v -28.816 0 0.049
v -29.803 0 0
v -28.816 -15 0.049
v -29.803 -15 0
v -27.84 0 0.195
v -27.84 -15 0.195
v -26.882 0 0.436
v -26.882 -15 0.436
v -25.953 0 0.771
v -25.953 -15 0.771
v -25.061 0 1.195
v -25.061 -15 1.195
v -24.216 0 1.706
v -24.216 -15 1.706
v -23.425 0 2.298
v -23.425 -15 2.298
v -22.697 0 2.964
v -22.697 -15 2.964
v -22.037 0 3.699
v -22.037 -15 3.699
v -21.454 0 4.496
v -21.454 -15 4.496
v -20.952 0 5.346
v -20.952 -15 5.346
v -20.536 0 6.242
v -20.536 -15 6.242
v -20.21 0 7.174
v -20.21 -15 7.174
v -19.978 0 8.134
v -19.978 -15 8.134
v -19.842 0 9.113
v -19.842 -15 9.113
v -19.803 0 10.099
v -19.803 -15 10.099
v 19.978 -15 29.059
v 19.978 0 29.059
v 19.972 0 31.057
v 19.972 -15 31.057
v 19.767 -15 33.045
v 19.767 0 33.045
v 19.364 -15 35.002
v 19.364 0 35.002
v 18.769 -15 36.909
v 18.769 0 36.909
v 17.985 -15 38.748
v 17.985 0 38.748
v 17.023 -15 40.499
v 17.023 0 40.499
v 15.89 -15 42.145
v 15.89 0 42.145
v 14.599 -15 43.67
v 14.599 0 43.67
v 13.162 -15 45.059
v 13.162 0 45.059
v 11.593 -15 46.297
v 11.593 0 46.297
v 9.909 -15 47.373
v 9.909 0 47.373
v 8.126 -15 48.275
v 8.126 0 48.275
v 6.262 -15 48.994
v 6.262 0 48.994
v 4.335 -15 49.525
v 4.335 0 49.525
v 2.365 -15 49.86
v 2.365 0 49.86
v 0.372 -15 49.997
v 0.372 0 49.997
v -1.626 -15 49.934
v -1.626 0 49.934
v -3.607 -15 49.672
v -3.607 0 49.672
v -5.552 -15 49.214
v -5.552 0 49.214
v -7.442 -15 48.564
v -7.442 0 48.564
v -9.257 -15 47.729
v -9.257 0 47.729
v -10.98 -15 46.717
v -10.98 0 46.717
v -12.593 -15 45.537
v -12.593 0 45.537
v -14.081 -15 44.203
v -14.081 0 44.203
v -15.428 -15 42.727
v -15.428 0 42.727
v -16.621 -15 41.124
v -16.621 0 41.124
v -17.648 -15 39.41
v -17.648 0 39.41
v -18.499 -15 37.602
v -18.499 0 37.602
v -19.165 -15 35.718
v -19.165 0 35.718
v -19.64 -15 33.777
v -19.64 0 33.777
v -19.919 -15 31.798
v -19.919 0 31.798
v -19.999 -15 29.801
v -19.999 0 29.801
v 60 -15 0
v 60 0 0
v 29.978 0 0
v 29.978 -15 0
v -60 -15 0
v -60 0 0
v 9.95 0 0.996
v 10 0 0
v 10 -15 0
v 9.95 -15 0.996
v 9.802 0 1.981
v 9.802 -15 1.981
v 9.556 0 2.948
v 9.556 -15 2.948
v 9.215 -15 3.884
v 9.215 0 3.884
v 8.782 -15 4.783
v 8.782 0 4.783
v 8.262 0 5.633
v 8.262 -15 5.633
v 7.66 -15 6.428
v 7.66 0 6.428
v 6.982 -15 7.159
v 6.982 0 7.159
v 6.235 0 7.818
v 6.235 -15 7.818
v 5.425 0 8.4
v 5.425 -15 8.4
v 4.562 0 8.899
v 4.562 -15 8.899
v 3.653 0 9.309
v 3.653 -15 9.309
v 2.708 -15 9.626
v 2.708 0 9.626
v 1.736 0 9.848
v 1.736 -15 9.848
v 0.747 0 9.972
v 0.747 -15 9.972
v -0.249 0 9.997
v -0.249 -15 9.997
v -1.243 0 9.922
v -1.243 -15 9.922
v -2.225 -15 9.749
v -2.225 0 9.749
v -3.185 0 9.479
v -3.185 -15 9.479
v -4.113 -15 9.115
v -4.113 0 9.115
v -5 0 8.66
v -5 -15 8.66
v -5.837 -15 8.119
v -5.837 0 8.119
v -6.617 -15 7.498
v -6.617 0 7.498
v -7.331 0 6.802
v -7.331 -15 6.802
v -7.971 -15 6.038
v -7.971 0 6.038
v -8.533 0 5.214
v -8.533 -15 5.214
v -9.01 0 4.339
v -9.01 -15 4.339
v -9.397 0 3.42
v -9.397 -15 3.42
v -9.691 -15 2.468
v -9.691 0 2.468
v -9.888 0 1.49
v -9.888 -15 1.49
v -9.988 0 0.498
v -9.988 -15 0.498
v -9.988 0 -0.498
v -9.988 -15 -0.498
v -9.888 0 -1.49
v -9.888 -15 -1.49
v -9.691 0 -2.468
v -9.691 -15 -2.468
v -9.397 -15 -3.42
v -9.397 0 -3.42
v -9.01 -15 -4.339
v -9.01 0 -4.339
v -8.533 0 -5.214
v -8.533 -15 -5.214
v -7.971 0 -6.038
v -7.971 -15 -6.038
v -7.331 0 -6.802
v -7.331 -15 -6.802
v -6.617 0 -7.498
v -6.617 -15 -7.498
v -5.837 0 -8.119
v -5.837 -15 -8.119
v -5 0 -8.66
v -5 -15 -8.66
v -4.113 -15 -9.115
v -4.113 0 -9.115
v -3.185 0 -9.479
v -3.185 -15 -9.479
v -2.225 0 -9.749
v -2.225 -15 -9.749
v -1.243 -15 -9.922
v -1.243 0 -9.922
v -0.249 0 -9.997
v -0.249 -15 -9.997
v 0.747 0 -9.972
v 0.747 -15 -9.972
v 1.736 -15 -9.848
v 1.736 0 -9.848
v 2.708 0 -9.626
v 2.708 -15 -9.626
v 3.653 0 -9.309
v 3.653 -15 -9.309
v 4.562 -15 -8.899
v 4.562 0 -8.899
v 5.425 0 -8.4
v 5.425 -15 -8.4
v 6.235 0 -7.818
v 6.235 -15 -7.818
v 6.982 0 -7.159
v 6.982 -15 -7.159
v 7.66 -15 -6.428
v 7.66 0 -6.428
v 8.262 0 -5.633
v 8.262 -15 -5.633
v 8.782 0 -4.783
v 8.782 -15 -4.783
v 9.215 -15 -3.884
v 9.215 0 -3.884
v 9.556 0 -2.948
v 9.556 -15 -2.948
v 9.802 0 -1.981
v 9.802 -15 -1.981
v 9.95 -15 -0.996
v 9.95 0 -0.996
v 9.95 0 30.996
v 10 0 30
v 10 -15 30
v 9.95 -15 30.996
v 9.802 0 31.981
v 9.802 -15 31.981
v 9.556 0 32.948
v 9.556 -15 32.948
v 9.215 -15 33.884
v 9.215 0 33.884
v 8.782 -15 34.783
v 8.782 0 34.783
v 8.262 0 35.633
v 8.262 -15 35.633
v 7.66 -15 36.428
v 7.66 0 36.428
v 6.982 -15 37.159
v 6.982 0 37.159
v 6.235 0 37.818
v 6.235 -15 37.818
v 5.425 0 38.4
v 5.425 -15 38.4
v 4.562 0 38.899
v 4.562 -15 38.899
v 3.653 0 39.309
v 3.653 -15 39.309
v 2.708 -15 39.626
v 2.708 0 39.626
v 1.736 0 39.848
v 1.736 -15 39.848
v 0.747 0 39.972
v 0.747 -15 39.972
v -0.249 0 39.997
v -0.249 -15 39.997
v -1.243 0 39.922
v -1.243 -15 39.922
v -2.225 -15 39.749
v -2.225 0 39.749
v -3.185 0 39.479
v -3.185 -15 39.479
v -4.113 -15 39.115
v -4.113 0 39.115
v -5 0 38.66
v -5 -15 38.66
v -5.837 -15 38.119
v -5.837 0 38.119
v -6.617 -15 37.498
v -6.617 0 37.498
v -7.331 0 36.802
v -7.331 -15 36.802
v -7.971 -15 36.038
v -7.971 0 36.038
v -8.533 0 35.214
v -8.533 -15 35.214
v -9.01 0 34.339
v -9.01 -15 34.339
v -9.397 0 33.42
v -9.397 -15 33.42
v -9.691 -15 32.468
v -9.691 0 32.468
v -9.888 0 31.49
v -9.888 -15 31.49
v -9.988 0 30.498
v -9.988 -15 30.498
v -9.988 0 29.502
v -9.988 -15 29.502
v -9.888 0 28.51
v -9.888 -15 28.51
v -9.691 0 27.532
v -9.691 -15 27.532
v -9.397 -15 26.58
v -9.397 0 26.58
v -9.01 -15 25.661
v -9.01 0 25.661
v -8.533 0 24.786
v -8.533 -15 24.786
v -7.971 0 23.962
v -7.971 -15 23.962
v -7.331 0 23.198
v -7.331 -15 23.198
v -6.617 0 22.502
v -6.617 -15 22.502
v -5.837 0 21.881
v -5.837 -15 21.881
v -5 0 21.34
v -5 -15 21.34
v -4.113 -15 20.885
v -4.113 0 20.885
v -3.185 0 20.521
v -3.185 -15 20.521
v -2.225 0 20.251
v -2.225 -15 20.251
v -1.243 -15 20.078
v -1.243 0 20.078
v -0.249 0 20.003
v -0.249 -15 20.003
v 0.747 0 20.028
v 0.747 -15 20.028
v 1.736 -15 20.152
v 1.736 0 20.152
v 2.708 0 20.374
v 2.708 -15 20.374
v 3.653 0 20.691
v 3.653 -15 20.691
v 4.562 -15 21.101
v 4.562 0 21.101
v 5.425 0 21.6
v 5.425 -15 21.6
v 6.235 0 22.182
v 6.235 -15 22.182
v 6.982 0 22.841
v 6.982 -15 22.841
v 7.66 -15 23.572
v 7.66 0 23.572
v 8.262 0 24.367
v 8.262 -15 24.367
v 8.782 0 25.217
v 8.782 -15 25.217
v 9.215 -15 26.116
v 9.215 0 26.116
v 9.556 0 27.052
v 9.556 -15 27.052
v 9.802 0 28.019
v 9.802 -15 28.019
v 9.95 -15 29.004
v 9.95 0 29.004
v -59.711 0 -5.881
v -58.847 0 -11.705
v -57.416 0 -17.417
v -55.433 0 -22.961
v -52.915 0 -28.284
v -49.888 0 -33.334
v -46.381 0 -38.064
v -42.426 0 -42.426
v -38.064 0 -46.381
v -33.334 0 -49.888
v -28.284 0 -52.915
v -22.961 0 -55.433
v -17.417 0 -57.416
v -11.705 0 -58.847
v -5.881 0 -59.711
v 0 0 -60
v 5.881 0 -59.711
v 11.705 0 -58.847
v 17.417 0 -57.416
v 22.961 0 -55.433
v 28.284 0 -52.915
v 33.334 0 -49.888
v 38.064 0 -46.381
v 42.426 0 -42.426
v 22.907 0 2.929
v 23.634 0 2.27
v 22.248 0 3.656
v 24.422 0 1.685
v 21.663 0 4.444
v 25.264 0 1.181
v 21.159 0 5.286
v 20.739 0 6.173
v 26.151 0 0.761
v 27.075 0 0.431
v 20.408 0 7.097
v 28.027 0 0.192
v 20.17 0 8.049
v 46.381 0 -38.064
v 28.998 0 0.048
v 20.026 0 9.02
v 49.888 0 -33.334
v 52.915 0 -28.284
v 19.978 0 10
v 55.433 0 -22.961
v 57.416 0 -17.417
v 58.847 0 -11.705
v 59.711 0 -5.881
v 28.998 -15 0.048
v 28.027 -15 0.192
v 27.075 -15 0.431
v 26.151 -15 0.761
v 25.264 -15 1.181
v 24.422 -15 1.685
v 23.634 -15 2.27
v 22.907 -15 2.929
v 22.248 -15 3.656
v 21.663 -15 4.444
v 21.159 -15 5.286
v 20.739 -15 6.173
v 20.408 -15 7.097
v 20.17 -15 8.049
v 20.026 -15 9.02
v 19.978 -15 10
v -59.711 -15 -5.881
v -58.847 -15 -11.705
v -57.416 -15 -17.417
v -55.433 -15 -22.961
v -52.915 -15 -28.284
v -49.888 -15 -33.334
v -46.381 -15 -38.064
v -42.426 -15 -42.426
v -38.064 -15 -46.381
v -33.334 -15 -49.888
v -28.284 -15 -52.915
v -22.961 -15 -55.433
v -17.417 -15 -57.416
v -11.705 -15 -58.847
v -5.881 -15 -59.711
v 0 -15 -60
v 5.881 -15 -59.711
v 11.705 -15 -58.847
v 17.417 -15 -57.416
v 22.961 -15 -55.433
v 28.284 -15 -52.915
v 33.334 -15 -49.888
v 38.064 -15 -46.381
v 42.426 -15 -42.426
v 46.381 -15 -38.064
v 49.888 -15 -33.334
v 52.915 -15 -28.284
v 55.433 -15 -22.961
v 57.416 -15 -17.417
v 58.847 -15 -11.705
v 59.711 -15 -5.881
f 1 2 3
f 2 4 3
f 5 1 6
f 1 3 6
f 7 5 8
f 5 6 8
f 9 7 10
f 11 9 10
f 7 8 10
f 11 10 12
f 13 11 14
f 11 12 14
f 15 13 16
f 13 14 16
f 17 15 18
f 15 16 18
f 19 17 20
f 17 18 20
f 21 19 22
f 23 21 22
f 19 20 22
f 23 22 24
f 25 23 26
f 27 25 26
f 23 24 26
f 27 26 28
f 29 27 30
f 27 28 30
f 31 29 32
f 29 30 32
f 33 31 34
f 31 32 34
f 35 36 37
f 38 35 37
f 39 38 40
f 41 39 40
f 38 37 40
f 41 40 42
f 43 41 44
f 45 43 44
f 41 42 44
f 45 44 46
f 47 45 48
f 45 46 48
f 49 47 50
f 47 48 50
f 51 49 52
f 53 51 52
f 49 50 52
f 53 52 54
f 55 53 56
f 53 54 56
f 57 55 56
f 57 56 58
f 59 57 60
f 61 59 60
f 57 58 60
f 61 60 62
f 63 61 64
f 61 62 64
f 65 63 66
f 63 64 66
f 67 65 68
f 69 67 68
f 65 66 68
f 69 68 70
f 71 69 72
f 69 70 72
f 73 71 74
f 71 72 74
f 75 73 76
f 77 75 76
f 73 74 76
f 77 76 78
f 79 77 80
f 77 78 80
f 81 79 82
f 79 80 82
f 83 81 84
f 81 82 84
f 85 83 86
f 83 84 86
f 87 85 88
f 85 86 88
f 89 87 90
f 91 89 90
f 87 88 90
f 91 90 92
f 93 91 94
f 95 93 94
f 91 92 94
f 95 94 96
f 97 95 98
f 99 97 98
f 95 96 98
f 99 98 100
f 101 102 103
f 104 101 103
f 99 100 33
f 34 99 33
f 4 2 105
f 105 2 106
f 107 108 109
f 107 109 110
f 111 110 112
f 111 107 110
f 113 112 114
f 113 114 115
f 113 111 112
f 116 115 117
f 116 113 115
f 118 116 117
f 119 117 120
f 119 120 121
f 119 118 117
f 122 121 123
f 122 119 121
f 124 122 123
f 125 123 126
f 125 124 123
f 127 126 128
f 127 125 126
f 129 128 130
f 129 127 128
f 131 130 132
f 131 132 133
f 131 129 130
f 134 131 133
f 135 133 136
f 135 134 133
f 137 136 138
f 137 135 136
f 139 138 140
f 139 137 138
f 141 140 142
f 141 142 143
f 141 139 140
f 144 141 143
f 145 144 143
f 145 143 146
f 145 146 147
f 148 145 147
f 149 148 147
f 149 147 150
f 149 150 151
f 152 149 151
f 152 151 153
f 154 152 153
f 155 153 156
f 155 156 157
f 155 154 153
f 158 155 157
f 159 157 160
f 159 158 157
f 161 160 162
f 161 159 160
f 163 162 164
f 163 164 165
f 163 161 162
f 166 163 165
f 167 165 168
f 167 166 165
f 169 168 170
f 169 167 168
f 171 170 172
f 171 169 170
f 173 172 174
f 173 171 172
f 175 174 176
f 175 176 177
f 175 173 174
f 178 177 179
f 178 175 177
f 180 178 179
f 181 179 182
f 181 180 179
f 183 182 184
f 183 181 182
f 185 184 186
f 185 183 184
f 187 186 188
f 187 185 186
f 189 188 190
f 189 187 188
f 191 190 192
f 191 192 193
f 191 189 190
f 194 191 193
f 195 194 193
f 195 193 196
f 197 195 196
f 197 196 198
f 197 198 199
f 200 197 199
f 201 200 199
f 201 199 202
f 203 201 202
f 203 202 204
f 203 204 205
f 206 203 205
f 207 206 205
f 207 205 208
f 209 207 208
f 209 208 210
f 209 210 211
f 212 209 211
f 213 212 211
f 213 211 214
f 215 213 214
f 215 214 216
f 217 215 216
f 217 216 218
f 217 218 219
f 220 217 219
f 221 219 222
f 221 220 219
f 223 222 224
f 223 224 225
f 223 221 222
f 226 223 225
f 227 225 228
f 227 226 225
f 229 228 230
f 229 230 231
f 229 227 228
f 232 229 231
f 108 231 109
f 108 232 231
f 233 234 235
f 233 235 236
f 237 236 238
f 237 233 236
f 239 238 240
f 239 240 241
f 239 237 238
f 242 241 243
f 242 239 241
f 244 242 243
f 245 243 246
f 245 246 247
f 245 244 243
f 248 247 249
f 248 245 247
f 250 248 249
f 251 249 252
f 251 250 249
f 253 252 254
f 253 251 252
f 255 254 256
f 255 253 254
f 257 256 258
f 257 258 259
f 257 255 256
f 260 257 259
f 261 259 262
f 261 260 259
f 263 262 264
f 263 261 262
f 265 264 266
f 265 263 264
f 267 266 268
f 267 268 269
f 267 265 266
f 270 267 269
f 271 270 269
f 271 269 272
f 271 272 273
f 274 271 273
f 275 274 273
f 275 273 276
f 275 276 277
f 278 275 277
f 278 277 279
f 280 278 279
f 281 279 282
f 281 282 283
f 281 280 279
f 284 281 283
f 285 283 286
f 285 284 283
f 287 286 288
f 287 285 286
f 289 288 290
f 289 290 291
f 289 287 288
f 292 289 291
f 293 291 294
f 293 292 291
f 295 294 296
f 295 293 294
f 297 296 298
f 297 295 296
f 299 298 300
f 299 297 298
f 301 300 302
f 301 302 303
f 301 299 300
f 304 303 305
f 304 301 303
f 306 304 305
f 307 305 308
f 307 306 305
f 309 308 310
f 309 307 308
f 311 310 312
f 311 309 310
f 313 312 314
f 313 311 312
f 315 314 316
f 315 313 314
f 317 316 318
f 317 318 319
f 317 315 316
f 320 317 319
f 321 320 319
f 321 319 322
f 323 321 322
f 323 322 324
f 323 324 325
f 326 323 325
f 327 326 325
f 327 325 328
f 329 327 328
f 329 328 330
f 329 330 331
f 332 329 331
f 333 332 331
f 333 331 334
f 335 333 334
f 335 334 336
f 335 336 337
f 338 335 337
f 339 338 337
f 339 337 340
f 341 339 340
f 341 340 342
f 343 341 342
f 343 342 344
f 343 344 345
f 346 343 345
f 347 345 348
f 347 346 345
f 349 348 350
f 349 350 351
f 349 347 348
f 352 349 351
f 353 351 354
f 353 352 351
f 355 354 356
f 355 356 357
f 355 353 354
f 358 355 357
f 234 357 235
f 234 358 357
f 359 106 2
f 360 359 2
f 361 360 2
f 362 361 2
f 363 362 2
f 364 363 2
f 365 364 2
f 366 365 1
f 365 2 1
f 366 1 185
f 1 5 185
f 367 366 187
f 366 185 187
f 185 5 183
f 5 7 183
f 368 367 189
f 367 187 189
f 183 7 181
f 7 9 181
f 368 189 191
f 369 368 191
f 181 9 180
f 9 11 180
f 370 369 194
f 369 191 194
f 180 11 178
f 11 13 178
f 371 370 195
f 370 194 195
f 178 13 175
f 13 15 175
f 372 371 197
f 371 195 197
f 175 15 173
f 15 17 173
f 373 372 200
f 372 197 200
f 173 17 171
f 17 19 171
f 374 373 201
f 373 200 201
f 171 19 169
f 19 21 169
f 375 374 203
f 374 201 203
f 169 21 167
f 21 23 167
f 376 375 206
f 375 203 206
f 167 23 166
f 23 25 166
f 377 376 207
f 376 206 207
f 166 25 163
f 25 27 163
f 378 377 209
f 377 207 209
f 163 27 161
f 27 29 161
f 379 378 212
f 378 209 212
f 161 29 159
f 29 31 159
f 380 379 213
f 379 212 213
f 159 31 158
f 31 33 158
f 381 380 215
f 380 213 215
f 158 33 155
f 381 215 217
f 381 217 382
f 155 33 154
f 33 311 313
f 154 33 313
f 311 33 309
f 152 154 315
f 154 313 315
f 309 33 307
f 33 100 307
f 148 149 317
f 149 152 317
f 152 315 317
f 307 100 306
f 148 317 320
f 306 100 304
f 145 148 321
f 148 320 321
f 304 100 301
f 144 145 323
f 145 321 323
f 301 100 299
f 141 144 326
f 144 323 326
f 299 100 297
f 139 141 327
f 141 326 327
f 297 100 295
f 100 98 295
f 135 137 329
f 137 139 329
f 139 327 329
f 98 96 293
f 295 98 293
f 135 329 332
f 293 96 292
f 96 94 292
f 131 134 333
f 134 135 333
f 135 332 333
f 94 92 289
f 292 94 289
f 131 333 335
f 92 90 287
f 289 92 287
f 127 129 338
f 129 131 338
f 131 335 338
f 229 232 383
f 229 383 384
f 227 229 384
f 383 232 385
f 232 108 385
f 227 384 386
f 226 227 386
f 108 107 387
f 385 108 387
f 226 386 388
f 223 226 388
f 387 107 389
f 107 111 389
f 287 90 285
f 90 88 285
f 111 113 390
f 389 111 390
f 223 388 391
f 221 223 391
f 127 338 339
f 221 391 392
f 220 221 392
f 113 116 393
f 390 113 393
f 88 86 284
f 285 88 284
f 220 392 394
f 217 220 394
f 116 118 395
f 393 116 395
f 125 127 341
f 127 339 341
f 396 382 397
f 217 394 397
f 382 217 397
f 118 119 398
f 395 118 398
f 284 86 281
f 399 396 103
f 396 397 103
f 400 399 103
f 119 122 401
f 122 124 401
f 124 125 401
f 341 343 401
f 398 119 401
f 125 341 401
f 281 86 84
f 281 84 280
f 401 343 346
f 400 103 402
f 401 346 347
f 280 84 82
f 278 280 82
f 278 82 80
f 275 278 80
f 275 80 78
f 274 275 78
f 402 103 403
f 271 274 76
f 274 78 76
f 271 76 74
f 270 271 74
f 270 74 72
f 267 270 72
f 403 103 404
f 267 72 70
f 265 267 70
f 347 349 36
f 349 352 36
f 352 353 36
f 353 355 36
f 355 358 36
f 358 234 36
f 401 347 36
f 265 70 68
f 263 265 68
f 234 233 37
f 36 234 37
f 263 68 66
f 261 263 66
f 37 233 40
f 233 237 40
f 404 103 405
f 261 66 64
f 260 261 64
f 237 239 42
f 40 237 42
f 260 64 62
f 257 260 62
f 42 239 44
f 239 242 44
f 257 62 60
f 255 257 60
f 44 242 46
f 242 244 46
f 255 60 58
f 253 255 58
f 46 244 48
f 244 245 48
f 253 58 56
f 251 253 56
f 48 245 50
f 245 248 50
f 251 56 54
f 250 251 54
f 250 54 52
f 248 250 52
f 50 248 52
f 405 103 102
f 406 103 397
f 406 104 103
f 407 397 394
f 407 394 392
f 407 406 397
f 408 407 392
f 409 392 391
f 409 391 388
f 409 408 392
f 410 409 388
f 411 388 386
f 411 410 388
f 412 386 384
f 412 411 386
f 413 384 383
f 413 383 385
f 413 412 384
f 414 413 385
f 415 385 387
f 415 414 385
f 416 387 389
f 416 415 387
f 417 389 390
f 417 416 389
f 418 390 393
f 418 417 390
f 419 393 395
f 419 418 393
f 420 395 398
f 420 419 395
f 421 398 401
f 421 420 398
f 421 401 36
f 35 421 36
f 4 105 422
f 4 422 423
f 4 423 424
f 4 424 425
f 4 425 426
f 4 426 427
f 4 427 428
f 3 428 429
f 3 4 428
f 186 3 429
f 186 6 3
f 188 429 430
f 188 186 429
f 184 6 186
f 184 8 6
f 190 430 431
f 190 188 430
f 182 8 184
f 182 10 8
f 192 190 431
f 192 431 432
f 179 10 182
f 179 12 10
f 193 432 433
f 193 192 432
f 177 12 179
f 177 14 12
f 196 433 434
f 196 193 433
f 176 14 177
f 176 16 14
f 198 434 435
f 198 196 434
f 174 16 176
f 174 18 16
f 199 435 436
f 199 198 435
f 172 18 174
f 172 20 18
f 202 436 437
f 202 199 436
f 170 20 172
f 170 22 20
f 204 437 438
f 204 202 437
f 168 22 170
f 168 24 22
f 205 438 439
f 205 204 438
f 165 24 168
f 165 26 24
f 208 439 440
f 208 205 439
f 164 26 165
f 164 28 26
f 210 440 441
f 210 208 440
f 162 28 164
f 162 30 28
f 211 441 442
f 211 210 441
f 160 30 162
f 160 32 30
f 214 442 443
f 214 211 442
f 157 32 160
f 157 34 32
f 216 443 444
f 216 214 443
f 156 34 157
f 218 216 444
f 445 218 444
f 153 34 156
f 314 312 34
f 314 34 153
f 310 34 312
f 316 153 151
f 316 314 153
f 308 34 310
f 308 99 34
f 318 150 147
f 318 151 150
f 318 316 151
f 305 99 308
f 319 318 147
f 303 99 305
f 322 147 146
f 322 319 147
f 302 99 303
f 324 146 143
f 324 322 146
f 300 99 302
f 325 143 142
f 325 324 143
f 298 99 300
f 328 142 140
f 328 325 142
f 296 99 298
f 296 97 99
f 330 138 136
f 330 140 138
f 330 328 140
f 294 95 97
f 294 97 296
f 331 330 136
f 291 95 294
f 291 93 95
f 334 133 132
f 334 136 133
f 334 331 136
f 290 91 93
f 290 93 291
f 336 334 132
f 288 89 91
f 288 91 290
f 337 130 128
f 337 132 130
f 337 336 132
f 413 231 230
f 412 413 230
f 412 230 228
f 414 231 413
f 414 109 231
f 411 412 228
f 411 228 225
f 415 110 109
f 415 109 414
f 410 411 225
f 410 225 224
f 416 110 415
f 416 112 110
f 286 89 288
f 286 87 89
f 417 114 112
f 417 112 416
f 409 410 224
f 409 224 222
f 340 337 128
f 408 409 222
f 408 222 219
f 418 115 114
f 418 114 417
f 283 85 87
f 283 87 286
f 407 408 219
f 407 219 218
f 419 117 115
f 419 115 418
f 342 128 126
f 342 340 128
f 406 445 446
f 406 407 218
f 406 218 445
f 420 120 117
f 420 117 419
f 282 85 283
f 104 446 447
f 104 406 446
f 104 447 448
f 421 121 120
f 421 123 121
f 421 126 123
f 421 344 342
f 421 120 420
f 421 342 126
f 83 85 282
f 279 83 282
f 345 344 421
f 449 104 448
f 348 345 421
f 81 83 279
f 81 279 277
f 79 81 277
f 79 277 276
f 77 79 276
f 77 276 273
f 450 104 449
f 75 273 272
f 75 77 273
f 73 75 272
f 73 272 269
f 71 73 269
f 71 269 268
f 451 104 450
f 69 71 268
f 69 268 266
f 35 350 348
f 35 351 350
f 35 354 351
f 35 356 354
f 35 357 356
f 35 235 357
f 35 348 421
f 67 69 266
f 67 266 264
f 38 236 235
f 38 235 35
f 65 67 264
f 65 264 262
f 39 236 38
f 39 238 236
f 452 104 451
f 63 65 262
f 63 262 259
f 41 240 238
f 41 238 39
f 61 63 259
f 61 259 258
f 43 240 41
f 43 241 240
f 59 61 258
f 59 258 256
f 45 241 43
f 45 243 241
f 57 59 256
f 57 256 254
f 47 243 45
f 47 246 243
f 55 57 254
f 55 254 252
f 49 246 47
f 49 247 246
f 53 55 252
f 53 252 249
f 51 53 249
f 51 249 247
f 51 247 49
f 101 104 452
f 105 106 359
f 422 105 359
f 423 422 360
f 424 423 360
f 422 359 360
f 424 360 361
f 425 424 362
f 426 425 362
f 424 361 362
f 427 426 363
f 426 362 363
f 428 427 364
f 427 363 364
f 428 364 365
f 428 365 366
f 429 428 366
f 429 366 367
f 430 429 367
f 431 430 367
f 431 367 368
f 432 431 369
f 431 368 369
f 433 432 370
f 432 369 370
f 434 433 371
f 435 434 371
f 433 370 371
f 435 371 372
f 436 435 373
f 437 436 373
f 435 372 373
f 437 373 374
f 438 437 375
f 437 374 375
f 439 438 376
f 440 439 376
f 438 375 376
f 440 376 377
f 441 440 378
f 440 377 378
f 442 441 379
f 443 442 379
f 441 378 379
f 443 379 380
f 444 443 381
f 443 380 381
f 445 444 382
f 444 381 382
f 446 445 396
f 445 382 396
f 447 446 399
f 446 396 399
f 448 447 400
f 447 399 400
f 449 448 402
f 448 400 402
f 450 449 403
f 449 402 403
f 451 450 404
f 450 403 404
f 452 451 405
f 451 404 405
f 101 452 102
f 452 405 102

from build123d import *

# Parameters (mm, degrees)
F0_R     = 10
F1_DEPTH = 15
F2_R     = 10
F3_R     = 10


with BuildPart() as f1:
    # F0 (on Front) → F1 (new body)
    with BuildSketch(Plane.XZ):
        with BuildLine():
            Line((-19.702956, 0), (-60, 0))
            ThreePointArc((-60, 0), (0, -60), (60, 0))
            Line((60, 0), (19.977827, 0))
            Line((19.977827, 0), (19.977827, 29.058505))
            ThreePointArc((19.977827, 29.058505), (0.37156, 49.996548), (-19.999013, 29.801323))
            Line((-19.999013, 29.801323), (-19.702956, 0))
        make_face()
        Circle(F0_R, mode=Mode.SUBTRACT)
        with Locations((0, 30)):
            Circle(F0_R, mode=Mode.SUBTRACT)
    extrude(amount=F1_DEPTH)

    # F2
    f2_edges = [f1.edges().sort_by_distance(p)[0] for p in [
        (19.977827, -7.5, 0),
    ]]
    fillet(f2_edges, radius=F2_R)

    # F3
    f3_edges = [f1.edges().sort_by_distance(p)[0] for p in [
        (-19.702956, -7.5, 0),
    ]]
    fillet(f3_edges, radius=F3_R)


solid = f1.part
